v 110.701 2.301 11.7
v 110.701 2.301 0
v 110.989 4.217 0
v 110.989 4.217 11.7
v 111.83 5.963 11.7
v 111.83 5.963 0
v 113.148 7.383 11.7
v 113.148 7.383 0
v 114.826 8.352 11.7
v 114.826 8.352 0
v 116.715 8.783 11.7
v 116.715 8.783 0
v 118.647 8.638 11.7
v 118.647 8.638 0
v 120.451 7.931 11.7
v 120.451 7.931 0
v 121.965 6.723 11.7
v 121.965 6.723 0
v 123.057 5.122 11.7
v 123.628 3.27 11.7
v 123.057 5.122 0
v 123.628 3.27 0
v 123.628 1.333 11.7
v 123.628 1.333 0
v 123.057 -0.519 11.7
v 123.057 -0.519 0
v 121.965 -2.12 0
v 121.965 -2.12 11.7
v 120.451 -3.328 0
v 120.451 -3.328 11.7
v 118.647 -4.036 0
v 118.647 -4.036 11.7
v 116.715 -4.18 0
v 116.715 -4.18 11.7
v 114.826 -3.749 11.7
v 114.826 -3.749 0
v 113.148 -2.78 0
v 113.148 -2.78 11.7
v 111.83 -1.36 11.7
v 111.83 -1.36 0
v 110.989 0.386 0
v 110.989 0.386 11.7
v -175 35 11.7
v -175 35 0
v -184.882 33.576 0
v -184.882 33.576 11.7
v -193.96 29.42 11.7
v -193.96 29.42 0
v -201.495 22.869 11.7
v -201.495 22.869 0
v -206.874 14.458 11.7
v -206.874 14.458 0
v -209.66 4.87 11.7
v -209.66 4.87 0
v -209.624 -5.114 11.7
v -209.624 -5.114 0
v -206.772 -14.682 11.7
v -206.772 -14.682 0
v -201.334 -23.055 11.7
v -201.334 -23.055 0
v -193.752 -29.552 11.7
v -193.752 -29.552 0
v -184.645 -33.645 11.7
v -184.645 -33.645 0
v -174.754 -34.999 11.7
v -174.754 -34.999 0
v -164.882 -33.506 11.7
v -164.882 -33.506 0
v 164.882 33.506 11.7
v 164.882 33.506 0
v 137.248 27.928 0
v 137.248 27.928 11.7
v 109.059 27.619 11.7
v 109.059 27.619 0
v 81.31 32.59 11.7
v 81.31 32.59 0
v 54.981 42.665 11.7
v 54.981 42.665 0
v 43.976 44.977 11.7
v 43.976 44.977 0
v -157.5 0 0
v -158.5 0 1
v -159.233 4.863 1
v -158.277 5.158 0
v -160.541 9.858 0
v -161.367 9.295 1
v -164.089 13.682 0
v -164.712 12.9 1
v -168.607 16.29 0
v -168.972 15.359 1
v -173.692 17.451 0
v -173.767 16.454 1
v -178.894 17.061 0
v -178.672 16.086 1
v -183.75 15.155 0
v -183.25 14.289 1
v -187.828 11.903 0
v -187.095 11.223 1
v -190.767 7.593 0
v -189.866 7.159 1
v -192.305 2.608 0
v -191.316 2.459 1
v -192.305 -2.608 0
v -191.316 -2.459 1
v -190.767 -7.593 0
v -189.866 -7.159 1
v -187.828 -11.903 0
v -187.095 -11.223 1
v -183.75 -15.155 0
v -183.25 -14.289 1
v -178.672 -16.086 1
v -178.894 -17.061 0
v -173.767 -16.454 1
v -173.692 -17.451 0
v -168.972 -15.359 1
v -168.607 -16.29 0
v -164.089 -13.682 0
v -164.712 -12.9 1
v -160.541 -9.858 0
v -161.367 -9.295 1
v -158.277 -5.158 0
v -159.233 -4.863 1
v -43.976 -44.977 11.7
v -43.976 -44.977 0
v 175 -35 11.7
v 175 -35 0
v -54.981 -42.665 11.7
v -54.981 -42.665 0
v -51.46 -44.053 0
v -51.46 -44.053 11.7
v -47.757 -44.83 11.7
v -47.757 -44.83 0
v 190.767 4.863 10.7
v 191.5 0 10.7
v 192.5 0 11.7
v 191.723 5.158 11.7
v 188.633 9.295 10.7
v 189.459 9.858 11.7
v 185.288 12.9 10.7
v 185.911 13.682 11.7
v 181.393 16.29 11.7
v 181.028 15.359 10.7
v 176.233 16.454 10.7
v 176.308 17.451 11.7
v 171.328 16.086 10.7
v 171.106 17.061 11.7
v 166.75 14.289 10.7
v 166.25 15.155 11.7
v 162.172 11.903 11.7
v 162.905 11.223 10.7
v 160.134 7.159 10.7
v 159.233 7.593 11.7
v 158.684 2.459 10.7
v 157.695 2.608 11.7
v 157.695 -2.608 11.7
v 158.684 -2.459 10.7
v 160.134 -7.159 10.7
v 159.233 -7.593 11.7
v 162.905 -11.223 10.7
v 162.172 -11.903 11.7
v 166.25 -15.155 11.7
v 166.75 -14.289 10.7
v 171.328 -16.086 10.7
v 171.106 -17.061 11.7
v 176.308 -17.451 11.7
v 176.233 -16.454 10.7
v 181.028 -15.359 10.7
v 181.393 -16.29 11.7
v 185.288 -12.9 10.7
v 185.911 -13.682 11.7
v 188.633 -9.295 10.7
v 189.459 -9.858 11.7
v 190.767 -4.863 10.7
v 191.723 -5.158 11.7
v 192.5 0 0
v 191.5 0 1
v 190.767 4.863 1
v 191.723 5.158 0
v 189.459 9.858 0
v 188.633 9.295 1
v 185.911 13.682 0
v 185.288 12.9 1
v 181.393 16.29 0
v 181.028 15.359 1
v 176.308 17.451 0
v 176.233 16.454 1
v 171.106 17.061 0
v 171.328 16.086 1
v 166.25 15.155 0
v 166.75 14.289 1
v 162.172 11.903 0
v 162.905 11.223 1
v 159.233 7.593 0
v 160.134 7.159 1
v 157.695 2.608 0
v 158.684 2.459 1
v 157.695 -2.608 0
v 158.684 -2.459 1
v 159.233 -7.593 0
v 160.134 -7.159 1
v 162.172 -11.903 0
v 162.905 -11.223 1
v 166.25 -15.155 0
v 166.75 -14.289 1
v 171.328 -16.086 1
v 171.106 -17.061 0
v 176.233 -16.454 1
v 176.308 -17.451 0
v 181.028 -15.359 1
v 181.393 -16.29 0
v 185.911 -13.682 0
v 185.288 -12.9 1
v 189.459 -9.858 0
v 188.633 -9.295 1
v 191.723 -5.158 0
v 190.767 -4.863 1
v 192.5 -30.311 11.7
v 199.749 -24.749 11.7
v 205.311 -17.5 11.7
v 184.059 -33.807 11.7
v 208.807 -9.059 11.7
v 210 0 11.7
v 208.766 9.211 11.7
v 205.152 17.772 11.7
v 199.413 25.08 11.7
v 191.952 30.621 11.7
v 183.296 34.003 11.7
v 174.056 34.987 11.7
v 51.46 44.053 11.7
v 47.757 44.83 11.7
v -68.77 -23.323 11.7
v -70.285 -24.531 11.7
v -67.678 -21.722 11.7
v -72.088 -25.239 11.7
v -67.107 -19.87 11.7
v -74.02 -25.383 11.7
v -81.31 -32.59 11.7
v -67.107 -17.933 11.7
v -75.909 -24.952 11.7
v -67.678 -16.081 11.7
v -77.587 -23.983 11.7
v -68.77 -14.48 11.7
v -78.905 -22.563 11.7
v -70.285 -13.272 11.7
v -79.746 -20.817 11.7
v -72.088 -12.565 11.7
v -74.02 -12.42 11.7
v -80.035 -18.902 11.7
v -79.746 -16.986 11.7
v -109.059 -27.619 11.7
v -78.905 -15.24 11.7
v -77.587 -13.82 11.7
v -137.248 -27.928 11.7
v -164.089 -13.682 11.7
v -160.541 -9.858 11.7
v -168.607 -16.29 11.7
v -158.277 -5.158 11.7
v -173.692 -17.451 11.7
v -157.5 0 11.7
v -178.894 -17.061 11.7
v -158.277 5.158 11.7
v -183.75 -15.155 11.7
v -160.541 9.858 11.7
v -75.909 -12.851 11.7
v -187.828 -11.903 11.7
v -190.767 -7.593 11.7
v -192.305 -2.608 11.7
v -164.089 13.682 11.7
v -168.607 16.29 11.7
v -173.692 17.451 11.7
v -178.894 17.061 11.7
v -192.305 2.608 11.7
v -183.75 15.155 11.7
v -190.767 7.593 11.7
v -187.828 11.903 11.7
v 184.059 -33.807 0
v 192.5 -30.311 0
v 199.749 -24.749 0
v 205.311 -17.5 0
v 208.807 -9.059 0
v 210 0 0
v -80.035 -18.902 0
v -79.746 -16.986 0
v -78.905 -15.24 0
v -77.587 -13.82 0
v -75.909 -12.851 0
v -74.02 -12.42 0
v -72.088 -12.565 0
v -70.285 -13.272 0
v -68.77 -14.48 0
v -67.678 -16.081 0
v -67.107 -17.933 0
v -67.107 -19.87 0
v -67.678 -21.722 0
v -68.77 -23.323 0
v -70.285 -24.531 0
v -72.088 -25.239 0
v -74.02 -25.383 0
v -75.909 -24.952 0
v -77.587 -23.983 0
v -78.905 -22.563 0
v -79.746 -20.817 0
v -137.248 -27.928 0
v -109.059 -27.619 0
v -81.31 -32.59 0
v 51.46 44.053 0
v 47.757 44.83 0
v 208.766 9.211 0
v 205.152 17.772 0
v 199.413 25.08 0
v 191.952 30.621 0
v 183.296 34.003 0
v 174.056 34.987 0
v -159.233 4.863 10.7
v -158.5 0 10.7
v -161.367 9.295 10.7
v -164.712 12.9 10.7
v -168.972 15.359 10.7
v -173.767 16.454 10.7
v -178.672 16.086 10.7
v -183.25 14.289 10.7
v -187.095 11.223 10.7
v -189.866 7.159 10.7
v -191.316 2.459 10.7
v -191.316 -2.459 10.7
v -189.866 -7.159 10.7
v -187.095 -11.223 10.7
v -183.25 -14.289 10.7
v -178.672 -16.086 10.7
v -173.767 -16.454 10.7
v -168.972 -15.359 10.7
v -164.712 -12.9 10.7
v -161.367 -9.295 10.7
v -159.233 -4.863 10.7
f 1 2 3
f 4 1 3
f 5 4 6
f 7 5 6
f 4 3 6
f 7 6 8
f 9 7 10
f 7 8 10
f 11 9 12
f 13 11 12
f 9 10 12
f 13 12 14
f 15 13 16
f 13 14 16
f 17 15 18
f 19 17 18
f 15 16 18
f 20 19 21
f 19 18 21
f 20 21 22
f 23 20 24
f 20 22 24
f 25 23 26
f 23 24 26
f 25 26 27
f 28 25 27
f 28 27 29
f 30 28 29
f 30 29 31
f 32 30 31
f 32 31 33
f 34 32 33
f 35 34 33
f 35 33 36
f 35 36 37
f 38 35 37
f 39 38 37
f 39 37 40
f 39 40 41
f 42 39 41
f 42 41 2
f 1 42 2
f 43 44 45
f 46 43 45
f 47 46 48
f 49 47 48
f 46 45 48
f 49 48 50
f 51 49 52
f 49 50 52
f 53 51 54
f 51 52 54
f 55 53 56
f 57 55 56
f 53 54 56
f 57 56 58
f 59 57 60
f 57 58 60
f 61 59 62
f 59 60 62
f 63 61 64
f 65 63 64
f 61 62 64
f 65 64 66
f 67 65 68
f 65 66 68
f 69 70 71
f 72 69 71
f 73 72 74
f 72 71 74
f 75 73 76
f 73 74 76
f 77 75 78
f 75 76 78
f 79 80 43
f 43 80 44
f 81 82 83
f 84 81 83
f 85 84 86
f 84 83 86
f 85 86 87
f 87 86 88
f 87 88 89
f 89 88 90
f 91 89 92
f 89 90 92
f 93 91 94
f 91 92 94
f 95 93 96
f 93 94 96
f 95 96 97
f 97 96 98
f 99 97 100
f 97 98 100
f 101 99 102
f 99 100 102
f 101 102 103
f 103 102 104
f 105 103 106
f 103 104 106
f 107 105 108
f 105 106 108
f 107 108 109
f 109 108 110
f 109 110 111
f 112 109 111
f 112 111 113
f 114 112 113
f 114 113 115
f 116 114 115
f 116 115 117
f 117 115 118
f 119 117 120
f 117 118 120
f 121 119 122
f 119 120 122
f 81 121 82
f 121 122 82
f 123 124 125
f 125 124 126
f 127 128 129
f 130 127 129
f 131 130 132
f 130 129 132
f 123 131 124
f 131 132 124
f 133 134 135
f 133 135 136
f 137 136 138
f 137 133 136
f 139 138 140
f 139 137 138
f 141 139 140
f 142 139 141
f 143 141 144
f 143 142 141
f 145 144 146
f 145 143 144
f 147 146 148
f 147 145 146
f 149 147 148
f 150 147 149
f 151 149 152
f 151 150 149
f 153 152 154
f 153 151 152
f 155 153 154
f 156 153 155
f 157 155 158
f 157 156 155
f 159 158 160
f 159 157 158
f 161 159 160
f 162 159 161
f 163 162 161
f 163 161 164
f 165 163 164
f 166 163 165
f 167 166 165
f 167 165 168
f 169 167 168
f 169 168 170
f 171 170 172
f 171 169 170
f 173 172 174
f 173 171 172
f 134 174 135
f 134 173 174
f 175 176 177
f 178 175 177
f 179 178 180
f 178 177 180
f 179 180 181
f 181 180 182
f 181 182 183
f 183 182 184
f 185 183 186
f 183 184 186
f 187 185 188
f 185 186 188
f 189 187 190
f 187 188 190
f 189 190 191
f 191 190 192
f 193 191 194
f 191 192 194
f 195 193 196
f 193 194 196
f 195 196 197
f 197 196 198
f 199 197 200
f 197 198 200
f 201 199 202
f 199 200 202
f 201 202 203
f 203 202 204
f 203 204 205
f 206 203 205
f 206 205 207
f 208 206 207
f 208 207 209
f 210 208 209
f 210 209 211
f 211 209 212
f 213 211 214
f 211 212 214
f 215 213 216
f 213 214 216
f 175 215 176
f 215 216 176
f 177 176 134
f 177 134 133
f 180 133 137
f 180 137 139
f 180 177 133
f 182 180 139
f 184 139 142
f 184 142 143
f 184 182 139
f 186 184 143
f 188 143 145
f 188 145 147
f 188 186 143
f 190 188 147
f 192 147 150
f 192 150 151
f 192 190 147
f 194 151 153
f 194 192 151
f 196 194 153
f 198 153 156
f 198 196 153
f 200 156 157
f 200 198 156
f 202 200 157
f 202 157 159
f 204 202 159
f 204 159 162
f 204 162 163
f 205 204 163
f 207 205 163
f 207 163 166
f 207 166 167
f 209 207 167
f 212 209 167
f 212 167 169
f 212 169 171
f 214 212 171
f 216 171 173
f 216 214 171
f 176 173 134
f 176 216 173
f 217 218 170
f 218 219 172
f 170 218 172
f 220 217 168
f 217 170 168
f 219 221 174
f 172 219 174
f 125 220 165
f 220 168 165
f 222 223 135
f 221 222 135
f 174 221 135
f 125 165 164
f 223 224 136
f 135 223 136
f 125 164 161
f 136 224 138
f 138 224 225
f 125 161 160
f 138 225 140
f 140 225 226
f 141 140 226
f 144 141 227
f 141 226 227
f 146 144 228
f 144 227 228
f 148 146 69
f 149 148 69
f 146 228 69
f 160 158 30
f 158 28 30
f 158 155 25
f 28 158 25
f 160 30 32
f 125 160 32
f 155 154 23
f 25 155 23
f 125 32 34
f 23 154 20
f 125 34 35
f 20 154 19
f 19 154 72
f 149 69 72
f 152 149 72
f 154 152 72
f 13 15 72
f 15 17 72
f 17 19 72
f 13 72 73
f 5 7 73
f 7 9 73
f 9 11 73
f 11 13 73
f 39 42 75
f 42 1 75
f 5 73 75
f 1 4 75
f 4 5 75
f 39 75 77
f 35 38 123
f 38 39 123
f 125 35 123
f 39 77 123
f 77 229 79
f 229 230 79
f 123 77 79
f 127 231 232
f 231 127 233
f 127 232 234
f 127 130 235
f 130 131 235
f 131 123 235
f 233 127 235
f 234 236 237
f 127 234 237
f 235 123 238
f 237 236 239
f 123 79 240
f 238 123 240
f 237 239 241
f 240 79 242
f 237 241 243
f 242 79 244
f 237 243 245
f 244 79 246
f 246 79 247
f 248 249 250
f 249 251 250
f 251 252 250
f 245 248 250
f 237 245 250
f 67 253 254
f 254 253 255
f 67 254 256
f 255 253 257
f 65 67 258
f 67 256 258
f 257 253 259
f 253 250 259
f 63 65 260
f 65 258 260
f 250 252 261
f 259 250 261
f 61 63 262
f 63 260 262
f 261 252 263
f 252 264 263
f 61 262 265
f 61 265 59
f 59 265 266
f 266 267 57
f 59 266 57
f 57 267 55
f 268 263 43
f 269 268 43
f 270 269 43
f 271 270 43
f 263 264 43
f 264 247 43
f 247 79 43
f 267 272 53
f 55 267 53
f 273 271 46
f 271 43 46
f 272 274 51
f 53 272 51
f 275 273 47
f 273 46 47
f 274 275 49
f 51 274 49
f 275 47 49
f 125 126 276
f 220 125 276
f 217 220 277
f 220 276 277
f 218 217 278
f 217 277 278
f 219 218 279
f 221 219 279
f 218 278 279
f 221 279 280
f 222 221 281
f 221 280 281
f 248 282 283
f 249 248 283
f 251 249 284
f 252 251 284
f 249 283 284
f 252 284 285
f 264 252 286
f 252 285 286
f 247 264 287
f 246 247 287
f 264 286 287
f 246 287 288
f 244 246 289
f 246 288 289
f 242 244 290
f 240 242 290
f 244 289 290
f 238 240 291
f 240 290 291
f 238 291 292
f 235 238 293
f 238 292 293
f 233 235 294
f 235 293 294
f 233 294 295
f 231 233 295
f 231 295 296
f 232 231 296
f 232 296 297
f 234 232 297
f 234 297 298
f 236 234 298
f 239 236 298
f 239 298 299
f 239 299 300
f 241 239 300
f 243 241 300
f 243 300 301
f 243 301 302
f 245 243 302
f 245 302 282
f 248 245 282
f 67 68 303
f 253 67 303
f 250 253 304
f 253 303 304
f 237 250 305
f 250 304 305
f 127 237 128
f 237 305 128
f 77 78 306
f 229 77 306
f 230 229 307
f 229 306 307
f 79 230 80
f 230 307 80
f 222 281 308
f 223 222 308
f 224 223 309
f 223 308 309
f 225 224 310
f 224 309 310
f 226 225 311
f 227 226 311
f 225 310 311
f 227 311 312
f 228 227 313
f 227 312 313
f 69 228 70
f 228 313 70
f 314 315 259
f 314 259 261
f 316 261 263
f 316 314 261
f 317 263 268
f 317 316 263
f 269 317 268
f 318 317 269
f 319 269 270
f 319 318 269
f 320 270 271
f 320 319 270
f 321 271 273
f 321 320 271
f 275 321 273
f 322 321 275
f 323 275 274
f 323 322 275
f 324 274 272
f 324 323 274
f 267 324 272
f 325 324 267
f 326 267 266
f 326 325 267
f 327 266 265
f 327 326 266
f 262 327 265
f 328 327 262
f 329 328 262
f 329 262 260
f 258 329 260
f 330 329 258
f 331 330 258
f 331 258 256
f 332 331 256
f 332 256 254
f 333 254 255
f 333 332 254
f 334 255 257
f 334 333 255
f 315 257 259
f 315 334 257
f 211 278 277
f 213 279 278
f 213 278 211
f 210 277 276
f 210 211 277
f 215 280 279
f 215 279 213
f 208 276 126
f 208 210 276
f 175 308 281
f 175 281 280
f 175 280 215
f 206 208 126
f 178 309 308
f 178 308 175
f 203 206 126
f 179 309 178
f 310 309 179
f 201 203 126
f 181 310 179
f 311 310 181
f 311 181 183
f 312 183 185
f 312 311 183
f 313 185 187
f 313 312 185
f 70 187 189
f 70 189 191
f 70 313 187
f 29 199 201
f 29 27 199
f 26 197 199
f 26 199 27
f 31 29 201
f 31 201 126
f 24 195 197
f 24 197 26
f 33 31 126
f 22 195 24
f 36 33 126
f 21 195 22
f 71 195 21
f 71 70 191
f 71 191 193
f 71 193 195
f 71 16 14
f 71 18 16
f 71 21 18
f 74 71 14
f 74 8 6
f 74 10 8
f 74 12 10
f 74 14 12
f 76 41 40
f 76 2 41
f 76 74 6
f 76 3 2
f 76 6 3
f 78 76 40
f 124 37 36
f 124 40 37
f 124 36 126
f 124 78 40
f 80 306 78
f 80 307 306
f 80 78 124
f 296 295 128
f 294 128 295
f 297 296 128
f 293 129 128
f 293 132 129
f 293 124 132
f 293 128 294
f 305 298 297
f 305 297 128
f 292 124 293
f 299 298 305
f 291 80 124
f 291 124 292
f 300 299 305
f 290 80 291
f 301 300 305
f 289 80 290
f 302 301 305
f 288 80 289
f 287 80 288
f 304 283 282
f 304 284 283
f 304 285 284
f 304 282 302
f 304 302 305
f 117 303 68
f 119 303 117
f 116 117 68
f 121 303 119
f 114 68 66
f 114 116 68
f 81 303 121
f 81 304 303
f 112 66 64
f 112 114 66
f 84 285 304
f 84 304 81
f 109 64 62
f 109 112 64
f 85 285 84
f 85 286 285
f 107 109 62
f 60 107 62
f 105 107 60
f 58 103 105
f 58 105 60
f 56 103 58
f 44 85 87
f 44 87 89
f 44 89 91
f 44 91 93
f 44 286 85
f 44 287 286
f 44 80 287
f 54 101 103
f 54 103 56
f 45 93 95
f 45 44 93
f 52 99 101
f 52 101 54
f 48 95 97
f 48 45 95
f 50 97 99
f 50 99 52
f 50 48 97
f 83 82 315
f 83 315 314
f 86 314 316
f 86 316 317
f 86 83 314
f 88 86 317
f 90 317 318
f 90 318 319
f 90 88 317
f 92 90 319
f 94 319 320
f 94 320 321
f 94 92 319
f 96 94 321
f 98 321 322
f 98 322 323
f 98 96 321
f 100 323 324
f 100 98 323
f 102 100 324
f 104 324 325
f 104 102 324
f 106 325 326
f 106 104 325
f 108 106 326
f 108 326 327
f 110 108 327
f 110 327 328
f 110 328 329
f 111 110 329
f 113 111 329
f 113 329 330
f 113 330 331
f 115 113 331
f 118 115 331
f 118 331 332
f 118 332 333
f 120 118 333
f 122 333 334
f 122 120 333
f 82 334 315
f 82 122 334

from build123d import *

# Parameters (mm, degrees)
CROQUIS1_R              = 16.5
SALIENTE_EXTRUIR1_DEPTH = 11.7
SALIENTE_EXTRUIR6_START = -11.7
CROQUIS9_R              = 16.5
SALIENTE_EXTRUIR6_DEPTH = 11.7
SALIENTE_EXTRUIR5_START = -11.7
CROQUIS8_R              = 35
CROQUIS8_R_2            = 16.5
CROQUIS8_R_3            = 22.5
SALIENTE_EXTRUIR5_DEPTH = 11.7
CHAFL_N1_SIZE           = 1
CORTAR_EXTRUIR7_REACH   = 217.086
CROQUIS19_R             = 6.5


with BuildPart() as part:
    # Croquis1 → Saliente-Extruir1 (new body)
    with BuildSketch(Plane.XY):
        with BuildLine():
            Line((-197.5, 25), (197.5, 25))
            ThreePointArc((197.5, 25), (203.120875688, 0), (197.5, -25))
            Line((197.5, -25), (-197.5, -25))
            ThreePointArc((-197.5, -25), (-203.120875688, 0), (-197.5, 25))
        make_face()
        with Locations((-175, 0)):
            Circle(CROQUIS1_R, mode=Mode.SUBTRACT)
        with Locations((175, 0)):
            Circle(CROQUIS1_R, mode=Mode.SUBTRACT)
    extrude(amount=SALIENTE_EXTRUIR1_DEPTH)

    # Croquis9 → Saliente-Extruir6 (add)
    # profile 1 of 17: a face of its own
    with BuildSketch(Plane.XY.offset(11.7).offset(SALIENTE_EXTRUIR6_START)):
        with BuildLine():
            ThreePointArc((-140, 0), (-142.732978058, 13.558735008), (-150.505102572, 25))
            Line((-150.505102572, 25), (-197.5, 25))
            ThreePointArc((-197.5, 25), (-203.120875688, 0), (-197.5, -25))
            Line((-197.5, -25), (-150.505102572, -25))
            ThreePointArc((-150.505102572, -25), (-142.732978058, -13.558735008), (-140, 0))
        make_face()
        with Locations((-175, 0)):
            Circle(CROQUIS9_R, mode=Mode.SUBTRACT)
    # profile 2 of 17: a face of its own
    with BuildSketch(Plane.XY.offset(11.7).offset(SALIENTE_EXTRUIR6_START)):
        with BuildLine():
            ThreePointArc((-150.505102572, 25), (-161.771243445, 32.403703492), (-175, 35))
            ThreePointArc((-175, 35), (-209.624362587, -5.114050788), (-164.881671498, -33.505513402))
            ThreePointArc((-164.881671498, -33.505513402), (-157.178530031, -30.123001313), (-150.505102572, -25))
            Line((-150.505102572, -25), (-197.5, -25))
            ThreePointArc((-197.5, -25), (-203.120875688, 0), (-197.5, 25))
            Line((-197.5, 25), (-150.505102572, 25))
        make_face()
    # profile 3 of 17: a face of its own
    with BuildSketch(Plane.XY.offset(11.7).offset(SALIENTE_EXTRUIR6_START)):
        with BuildLine():
            Line((43.975947947, 44.976683861), (-175, 35))
            ThreePointArc((-175, 35), (-161.771243445, 32.403703492), (-150.505102572, 25))
            Line((-150.505102572, 25), (22.639320225, 25))
            ThreePointArc((22.639320225, 25), (29.62214595, 38.92472541), (43.975947947, 44.976683861))
        make_face()
    # profile 4 of 17: a face of its own
    with BuildSketch(Plane.XY.offset(11.7).offset(SALIENTE_EXTRUIR6_START)):
        with BuildLine():
            Line((22.639320225, 25), (-150.505102572, 25))
            ThreePointArc((-150.505102572, 25), (-142.732978058, 13.558735008), (-140, 0))
            ThreePointArc((-140, 0), (-142.732978058, -13.558735008), (-150.505102572, -25))
            Line((-150.505102572, -25), (-67.360679775, -25))
            ThreePointArc((-67.360679775, -25), (-46.251939508, -0.034857057), (-22.5, -22.5))
            ThreePointArc((-22.5, -22.5), (-22.534857057, -23.751939508), (-22.639320225, -25))
            Line((-22.639320225, -25), (150.505102572, -25))
            ThreePointArc((150.505102572, -25), (140, 0), (150.505102572, 25))
            Line((150.505102572, 25), (67.360679775, 25))
            ThreePointArc((67.360679775, 25), (67.465142943, 23.751939508), (67.5, 22.5))
            ThreePointArc((67.5, 22.5), (43.748060492, 0.034857057), (22.639320225, 25))
        make_face()
    # profile 5 of 17: a face of its own
    with BuildSketch(Plane.XY.offset(11.7).offset(SALIENTE_EXTRUIR6_START)):
        with BuildLine():
            ThreePointArc((-150.505102572, -25), (-157.178530031, -30.123001313), (-164.881671498, -33.505513402))
            ThreePointArc((-164.881671498, -33.505513402), (-109.058760851, -27.618859086), (-54.980531281, -42.665291849))
            ThreePointArc((-54.980531281, -42.665291849), (-63.425637497, -35.413012152), (-67.360679775, -25))
            Line((-67.360679775, -25), (-150.505102572, -25))
        make_face()
    # profile 6 of 17: a face of its own
    with BuildSketch(Plane.XY.offset(11.7).offset(SALIENTE_EXTRUIR6_START)):
        with BuildLine():
            ThreePointArc((-67.360679775, -25), (-63.425637497, -35.413012152), (-54.980531281, -42.665291849))
            ThreePointArc((-54.980531281, -42.665291849), (-49.624960897, -44.519530801), (-43.975947947, -44.976683861))
            ThreePointArc((-43.975947947, -44.976683861), (-29.62214595, -38.92472541), (-22.639320225, -25))
            Line((-22.639320225, -25), (-67.360679775, -25))
        make_face()
    # profile 7 of 17: a face of its own
    with BuildSketch(Plane.XY.offset(11.7).offset(SALIENTE_EXTRUIR6_START)):
        with BuildLine():
            ThreePointArc((-22.5, -22.5), (-46.251939508, -0.034857057), (-67.360679775, -25))
            Line((-67.360679775, -25), (-22.639320225, -25))
            ThreePointArc((-22.639320225, -25), (-22.534857057, -23.751939508), (-22.5, -22.5))
        make_face()
    # profile 8 of 17: a face of its own
    with BuildSketch(Plane.XY.offset(11.7).offset(SALIENTE_EXTRUIR6_START)):
        with BuildLine():
            ThreePointArc((-67.360679775, -25), (-63.425637497, -35.413012152), (-54.980531281, -42.665291849))
            ThreePointArc((-54.980531281, -42.665291849), (-49.624960897, -44.519530801), (-43.975947947, -44.976683861))
            ThreePointArc((-43.975947947, -44.976683861), (-29.62214595, -38.92472541), (-22.639320225, -25))
            Line((-22.639320225, -25), (-67.360679775, -25))
        make_face()
    # profile 9 of 17: a face of its own
    with BuildSketch(Plane.XY.offset(11.7).offset(SALIENTE_EXTRUIR6_START)):
        with BuildLine():
            ThreePointArc((-22.5, -22.5), (-46.251939508, -0.034857057), (-67.360679775, -25))
            Line((-67.360679775, -25), (-22.639320225, -25))
            ThreePointArc((-22.639320225, -25), (-22.534857057, -23.751939508), (-22.5, -22.5))
        make_face()
    # profile 10 of 17: a face of its own
    with BuildSketch(Plane.XY.offset(11.7).offset(SALIENTE_EXTRUIR6_START)):
        with BuildLine():
            ThreePointArc((54.980531281, 42.665291849), (49.624960897, 44.519530801), (43.975947947, 44.976683861))
            ThreePointArc((43.975947947, 44.976683861), (29.62214595, 38.92472541), (22.639320225, 25))
            Line((22.639320225, 25), (67.360679775, 25))
            ThreePointArc((67.360679775, 25), (63.425637497, 35.413012152), (54.980531281, 42.665291849))
        make_face()
    # profile 11 of 17: a face of its own
    with BuildSketch(Plane.XY.offset(11.7).offset(SALIENTE_EXTRUIR6_START)):
        with BuildLine():
            Line((67.360679775, 25), (22.639320225, 25))
            ThreePointArc((22.639320225, 25), (43.748060492, 0.034857057), (67.5, 22.5))
            ThreePointArc((67.5, 22.5), (67.465142943, 23.751939508), (67.360679775, 25))
        make_face()
    # profile 12 of 17: a face of its own
    with BuildSketch(Plane.XY.offset(11.7).offset(SALIENTE_EXTRUIR6_START)):
        with BuildLine():
            ThreePointArc((54.980531281, 42.665291849), (49.624960897, 44.519530801), (43.975947947, 44.976683861))
            ThreePointArc((43.975947947, 44.976683861), (29.62214595, 38.92472541), (22.639320225, 25))
            Line((22.639320225, 25), (67.360679775, 25))
            ThreePointArc((67.360679775, 25), (63.425637497, 35.413012152), (54.980531281, 42.665291849))
        make_face()
    # profile 13 of 17: a face of its own
    with BuildSketch(Plane.XY.offset(11.7).offset(SALIENTE_EXTRUIR6_START)):
        with BuildLine():
            Line((67.360679775, 25), (22.639320225, 25))
            ThreePointArc((22.639320225, 25), (43.748060492, 0.034857057), (67.5, 22.5))
            ThreePointArc((67.5, 22.5), (67.465142943, 23.751939508), (67.360679775, 25))
        make_face()
    # profile 14 of 17: a face of its own
    with BuildSketch(Plane.XY.offset(11.7).offset(SALIENTE_EXTRUIR6_START)):
        with BuildLine():
            ThreePointArc((164.881671498, 33.505513402), (109.058760851, 27.618859086), (54.980531281, 42.665291849))
            ThreePointArc((54.980531281, 42.665291849), (63.425637497, 35.413012152), (67.360679775, 25))
            Line((67.360679775, 25), (150.505102572, 25))
            ThreePointArc((150.505102572, 25), (157.178530031, 30.123001313), (164.881671498, 33.505513402))
        make_face()
    # profile 15 of 17: a face of its own
    with BuildSketch(Plane.XY.offset(11.7).offset(SALIENTE_EXTRUIR6_START)):
        with BuildLine():
            ThreePointArc((-22.639320225, -25), (-29.62214595, -38.92472541), (-43.975947947, -44.976683861))
            Line((-43.975947947, -44.976683861), (175, -35))
            ThreePointArc((175, -35), (161.771243445, -32.403703492), (150.505102572, -25))
            Line((150.505102572, -25), (-22.639320225, -25))
        make_face()
    # profile 16 of 17: a face of its own
    with BuildSketch(Plane.XY.offset(11.7).offset(SALIENTE_EXTRUIR6_START)):
        with BuildLine():
            ThreePointArc((210, 0), (195.866941588, 28.099301571), (164.881671498, 33.505513402))
            ThreePointArc((164.881671498, 33.505513402), (157.178530031, 30.123001313), (150.505102572, 25))
            Line((150.505102572, 25), (197.5, 25))
            ThreePointArc((197.5, 25), (203.120875688, 0), (197.5, -25))
            Line((197.5, -25), (150.505102572, -25))
            ThreePointArc((150.505102572, -25), (161.771243445, -32.403703492), (175, -35))
            ThreePointArc((175, -35), (199.748737342, -24.748737342), (210, 0))
        make_face()
    # profile 17 of 17: a face of its own
    with BuildSketch(Plane.XY.offset(11.7).offset(SALIENTE_EXTRUIR6_START)):
        with BuildLine():
            Line((197.5, 25), (150.505102572, 25))
            ThreePointArc((150.505102572, 25), (140, 0), (150.505102572, -25))
            Line((150.505102572, -25), (197.5, -25))
            ThreePointArc((197.5, -25), (203.120875688, 0), (197.5, 25))
        make_face()
        with Locations((175, 0)):
            Circle(CROQUIS9_R, mode=Mode.SUBTRACT)
    extrude(amount=SALIENTE_EXTRUIR6_DEPTH)

    # Croquis8 → Saliente-Extruir5 (add)
    # profile 1 of 4: a face of its own
    with BuildSketch(Plane.XY.offset(11.7).offset(SALIENTE_EXTRUIR5_START)):
        with Locations((-175, 0)):
            Circle(CROQUIS8_R)
        with Locations((-175, 0)):
            Circle(CROQUIS8_R_2, mode=Mode.SUBTRACT)
    # profile 2 of 4: a face of its own
    with BuildSketch(Plane.XY.offset(11.7).offset(SALIENTE_EXTRUIR5_START)):
        with Locations((175, 0)):
            Circle(CROQUIS8_R)
        with Locations((175, 0)):
            Circle(CROQUIS8_R_2, mode=Mode.SUBTRACT)
    # profile 3 of 4: a face of its own
    with BuildSketch(Plane.XY.offset(11.7).offset(SALIENTE_EXTRUIR5_START)):
        with Locations((45, 22.5)):
            Circle(CROQUIS8_R_3)
    # profile 4 of 4: a face of its own
    with BuildSketch(Plane.XY.offset(11.7).offset(SALIENTE_EXTRUIR5_START)):
        with Locations((-45, -22.5)):
            Circle(CROQUIS8_R_3)
    extrude(amount=SALIENTE_EXTRUIR5_DEPTH)

    # Chaflán1
    chafl_n1_edges = [part.edges().sort_by_distance(p)[0] for p in [
        (-191.5, 0, 0),
        (-191.5, 0, 11.7),
        (158.5, 0, 0),
        (158.5, 0, 11.7),
    ]]
    chamfer(chafl_n1_edges, length=CHAFL_N1_SIZE)

    # Croquis19 → Cortar-Extruir7 (cut, up to next)
    with BuildSketch(Plane(origin=(0, 0, 0), x_dir=(-1, 0, 0), z_dir=(0, 0, -1)), mode=Mode.PRIVATE) as cortar_extruir7_sk1:
        with Locations((73.534579942, -18.901548417)):
            Circle(CROQUIS19_R)
    cortar_extruir7_tool1 = extrude(cortar_extruir7_sk1.sketch, amount=-CORTAR_EXTRUIR7_REACH, mode=Mode.PRIVATE) & part.part
    # Croquis19 → Cortar-Extruir7 (cut, up to next)
    with BuildSketch(Plane(origin=(0, 0, 0), x_dir=(-1, 0, 0), z_dir=(0, 0, -1)), mode=Mode.PRIVATE) as cortar_extruir7_sk2:
        with Locations((-117.200528877, 2.301431648)):
            Circle(CROQUIS19_R)
    cortar_extruir7_tool2 = extrude(cortar_extruir7_sk2.sketch, amount=-CORTAR_EXTRUIR7_REACH, mode=Mode.PRIVATE) & part.part
    add(cortar_extruir7_tool1.solids().sort_by_distance((-73.53458, -18.901548, 0))[0], mode=Mode.SUBTRACT)
    add(cortar_extruir7_tool2.solids().sort_by_distance((117.200529, 2.301432, 0))[0], mode=Mode.SUBTRACT)


solid = part.part
